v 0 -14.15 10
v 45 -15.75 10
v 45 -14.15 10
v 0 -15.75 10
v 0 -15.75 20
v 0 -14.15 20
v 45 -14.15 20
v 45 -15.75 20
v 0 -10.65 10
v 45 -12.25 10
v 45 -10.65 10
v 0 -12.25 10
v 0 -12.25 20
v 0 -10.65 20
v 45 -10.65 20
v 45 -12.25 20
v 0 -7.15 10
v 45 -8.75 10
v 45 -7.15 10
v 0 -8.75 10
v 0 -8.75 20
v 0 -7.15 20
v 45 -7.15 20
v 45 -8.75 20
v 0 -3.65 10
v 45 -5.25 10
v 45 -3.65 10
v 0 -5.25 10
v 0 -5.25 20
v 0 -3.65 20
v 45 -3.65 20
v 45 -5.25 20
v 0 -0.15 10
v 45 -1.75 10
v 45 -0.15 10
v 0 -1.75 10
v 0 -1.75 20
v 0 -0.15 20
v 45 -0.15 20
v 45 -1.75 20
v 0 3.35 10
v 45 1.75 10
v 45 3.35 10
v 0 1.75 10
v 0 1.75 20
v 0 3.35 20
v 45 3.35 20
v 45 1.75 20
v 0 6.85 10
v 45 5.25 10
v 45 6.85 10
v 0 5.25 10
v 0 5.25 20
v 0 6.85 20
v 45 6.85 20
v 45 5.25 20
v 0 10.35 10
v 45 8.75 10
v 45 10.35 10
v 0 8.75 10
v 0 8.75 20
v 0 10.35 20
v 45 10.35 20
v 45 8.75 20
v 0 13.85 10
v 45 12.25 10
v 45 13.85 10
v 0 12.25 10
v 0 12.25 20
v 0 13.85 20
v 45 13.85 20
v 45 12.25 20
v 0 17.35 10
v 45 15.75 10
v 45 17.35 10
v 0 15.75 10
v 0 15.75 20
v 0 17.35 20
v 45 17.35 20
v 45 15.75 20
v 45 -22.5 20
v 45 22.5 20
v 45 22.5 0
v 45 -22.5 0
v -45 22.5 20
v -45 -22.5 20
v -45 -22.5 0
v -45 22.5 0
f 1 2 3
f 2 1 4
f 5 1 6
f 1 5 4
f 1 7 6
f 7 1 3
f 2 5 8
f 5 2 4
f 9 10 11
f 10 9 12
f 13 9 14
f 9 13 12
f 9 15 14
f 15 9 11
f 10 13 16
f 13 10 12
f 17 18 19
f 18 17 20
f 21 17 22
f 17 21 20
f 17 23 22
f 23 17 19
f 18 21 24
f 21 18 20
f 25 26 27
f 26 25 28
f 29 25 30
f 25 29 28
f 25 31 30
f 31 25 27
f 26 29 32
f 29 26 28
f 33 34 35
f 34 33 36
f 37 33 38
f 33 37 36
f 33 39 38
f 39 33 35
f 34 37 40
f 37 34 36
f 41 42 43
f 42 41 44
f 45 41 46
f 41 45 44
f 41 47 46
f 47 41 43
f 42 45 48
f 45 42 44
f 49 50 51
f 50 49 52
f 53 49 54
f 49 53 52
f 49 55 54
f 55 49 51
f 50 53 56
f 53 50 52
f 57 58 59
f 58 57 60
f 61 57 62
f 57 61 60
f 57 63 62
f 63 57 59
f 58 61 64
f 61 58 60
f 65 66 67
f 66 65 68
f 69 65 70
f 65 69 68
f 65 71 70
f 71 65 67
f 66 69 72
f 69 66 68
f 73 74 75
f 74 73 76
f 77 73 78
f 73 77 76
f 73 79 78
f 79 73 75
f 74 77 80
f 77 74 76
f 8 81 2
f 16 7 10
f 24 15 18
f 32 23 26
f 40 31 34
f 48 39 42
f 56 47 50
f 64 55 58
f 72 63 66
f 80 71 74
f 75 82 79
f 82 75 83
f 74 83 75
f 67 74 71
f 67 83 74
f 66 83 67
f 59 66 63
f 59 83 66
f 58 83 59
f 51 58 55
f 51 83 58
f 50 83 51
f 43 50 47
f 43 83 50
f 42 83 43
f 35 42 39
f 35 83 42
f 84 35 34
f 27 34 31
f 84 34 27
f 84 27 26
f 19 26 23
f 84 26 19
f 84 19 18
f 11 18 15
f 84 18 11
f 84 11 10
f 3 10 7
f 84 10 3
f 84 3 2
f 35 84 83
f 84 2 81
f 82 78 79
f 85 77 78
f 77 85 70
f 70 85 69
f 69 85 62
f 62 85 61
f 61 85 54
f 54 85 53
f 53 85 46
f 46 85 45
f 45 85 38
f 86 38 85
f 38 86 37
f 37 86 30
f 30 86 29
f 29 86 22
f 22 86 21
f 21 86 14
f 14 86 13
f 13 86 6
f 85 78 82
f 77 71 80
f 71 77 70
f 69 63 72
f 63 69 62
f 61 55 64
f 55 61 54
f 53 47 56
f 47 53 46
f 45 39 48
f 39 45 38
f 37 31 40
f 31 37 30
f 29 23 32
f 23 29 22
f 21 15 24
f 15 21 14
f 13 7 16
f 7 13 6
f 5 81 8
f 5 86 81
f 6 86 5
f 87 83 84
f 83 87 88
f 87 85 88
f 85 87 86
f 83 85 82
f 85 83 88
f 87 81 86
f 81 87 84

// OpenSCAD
// Microscope slide drying rack
// Print orientation: base block on XY plane, slots open upward (+Z)

// ---------------- Parameters ----------------
block_len    = 90;    // block length along X (mm)
block_wid    = 45;    // block width along Y (mm)
block_h      = 20;    // block height along Z (mm)

slot_count   = 10;    // number of slide slots
slot_len     = 77;    // slot length along X (mm)
slot_w       = 1.6;   // slot width along Y (mm)
slot_depth   = 10;    // slot depth from top face (mm)
slot_pitch   = 3.5;   // centre-to-centre slot spacing along Y (mm)

eps          = 0.5;   // overcut so cutting faces are not coplanar (mm)

$fn = 64;

// ---------------- Derived ----------------
first_y = -(slot_count - 1) * slot_pitch / 2;   // Y of first slot (group centred)

// ---------------- Model ----------------
difference() {
    // Solid base block, centred in X and Y, resting on z = 0
    translate([-block_len / 2, -block_wid / 2, 0])
        cube([block_len, block_wid, block_h]);

    // Parallel slots running along X, open at the top
    for (i = [0 : slot_count - 1]) {
        translate([0, first_y + i * slot_pitch, block_h - slot_depth])
            cube([slot_len, slot_w, slot_depth + eps]);
    }
}
